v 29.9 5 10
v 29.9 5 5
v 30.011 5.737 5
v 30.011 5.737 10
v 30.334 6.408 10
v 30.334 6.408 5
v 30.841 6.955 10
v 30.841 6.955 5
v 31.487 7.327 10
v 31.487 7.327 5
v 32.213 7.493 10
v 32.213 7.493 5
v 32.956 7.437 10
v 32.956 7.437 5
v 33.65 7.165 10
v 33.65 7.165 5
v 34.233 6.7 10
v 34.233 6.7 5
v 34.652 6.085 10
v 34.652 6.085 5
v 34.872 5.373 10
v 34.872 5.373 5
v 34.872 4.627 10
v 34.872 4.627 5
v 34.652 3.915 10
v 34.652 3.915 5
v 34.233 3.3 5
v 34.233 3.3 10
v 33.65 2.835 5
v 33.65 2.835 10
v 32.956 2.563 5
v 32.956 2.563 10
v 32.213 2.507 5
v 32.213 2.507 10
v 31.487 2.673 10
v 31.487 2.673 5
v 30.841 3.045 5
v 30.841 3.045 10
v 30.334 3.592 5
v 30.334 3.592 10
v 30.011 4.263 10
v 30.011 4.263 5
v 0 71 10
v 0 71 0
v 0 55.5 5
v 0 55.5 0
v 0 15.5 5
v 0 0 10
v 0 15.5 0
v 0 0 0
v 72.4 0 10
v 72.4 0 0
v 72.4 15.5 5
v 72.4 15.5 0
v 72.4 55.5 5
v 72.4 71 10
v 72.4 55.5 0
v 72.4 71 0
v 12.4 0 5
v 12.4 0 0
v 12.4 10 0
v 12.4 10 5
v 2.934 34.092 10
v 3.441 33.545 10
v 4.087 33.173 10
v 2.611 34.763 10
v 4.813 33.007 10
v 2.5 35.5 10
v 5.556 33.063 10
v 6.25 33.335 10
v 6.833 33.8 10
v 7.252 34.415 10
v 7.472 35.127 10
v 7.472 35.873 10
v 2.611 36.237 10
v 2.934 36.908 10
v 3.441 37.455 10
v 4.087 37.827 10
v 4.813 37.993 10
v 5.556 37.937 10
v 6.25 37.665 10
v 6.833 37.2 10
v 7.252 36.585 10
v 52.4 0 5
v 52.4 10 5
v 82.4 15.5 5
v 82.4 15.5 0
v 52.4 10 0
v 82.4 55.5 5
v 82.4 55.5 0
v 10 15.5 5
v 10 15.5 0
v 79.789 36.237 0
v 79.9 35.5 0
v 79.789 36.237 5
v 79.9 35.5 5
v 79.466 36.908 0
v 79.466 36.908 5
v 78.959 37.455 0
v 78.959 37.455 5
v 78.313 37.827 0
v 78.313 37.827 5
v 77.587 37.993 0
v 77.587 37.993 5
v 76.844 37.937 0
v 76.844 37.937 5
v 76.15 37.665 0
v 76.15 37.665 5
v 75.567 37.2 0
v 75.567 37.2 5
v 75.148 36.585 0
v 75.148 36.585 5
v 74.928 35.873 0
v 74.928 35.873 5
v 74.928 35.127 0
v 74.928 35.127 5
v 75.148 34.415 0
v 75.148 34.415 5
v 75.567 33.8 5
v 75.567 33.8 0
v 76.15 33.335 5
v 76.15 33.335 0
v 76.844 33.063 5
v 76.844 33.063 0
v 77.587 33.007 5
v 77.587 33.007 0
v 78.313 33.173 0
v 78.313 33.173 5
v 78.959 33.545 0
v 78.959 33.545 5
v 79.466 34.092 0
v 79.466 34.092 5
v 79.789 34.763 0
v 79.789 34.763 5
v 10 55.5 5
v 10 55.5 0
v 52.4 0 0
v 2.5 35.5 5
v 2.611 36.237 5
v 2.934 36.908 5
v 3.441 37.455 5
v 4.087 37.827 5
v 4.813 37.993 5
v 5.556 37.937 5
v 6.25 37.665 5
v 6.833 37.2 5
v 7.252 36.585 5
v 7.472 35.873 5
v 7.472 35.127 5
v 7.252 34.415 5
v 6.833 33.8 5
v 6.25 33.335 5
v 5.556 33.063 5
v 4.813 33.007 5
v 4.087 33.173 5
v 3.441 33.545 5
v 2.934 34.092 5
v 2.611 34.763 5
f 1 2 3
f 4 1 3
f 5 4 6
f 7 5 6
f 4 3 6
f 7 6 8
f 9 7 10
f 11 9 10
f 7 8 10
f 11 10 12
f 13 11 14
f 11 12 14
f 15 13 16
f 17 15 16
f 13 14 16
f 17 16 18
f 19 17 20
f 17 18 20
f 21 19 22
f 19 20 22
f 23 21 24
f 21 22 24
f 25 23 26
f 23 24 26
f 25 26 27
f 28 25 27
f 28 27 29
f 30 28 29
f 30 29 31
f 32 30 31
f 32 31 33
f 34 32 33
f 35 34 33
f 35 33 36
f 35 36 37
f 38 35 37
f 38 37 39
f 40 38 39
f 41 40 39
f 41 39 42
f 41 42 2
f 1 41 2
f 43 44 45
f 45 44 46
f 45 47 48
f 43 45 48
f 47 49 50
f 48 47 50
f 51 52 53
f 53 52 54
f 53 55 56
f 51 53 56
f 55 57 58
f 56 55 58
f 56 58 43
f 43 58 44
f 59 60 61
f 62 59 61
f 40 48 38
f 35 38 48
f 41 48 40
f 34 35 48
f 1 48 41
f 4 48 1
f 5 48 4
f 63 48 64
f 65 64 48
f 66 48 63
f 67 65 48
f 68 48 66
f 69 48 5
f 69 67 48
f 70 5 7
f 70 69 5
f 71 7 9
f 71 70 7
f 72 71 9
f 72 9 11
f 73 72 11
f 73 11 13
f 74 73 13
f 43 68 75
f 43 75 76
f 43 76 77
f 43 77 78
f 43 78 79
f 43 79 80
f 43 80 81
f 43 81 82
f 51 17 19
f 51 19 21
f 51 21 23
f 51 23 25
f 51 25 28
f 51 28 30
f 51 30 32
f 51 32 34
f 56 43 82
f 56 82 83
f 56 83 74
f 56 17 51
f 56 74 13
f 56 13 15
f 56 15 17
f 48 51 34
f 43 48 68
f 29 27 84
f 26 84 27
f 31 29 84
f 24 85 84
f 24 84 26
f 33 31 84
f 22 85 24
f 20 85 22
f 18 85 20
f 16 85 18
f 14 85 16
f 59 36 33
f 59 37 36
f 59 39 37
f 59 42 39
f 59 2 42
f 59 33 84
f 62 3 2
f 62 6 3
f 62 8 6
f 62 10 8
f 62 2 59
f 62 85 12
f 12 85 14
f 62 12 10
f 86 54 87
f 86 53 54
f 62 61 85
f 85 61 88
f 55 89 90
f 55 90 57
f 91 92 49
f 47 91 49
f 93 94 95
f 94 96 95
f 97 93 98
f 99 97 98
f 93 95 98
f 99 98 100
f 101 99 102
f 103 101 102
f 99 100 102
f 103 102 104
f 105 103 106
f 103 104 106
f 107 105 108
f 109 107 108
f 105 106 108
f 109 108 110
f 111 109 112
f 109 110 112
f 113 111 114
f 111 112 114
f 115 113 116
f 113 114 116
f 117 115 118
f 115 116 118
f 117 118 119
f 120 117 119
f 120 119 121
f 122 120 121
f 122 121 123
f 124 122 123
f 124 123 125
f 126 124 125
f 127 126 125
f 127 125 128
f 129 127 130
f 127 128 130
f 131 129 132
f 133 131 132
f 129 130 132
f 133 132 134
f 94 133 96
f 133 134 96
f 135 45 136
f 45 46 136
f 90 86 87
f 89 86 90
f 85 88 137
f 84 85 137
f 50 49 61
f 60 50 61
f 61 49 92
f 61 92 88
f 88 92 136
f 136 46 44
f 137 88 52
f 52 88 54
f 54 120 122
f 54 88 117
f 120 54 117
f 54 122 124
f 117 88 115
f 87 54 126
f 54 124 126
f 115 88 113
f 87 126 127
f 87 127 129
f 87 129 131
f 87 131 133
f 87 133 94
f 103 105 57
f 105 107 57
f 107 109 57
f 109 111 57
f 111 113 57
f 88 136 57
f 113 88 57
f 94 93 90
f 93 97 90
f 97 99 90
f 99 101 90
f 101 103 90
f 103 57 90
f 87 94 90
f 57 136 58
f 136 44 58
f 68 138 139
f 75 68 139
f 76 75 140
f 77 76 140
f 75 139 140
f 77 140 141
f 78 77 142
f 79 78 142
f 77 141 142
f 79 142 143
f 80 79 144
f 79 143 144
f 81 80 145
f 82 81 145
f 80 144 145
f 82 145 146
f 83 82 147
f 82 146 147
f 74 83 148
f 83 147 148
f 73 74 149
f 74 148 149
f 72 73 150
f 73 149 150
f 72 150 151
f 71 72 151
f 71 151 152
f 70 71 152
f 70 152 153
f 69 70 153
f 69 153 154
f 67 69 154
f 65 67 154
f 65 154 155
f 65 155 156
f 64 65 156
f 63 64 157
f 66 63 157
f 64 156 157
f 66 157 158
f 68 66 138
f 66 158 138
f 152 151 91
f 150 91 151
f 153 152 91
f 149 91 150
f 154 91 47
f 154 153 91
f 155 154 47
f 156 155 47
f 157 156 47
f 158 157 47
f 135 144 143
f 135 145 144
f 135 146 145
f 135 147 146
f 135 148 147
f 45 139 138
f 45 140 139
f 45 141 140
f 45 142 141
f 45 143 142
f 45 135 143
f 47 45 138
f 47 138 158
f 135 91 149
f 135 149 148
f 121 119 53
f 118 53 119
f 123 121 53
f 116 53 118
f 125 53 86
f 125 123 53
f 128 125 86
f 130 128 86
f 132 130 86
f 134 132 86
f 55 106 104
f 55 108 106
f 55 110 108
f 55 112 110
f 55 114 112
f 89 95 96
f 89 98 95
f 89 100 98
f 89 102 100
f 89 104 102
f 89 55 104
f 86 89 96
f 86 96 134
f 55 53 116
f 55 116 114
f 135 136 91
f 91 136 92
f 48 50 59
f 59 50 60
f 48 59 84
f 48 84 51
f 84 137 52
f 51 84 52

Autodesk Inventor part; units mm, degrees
ref_plane "YZ Plane" through (0, 0, 0) normal (1, 0, 0) x (0, 1, 0)
ref_plane "XZ Plane" through (0, 0, 0) normal (0, 1, 0) x (-1, 0, 0)
ref_plane "XY Plane" through (0, 0, 0) normal (0, 0, 1) x (1, 0, 0)
sketch "Sketch1" plane through (0, 0, 0) normal (0, 0, 1) x (1, 0, 0)
  line L0 (0, 0) -> (72.4, 0)
  line L1 (72.4, 0) -> (72.4, 71)
  line L2 (72.4, 71) -> (0, 71)
  line L3 (0, 71) -> (0, 0)
  dimension "d0" = 72.4
  dimension "d1" = 71
extrude "Extrusion1" add sketch "Sketch1" along normal blind 10
sketch "Sketch2" plane through (0, 0, 10) normal (0, 0, 1) x (1, 0, 0)
  line L0 (72.4, 0) -> (72.4, 71) projected
  line L1 (72.4, 15.5) -> (82.4, 15.5)
  line L2 (82.4, 15.5) -> (82.4, 55.5)
  line L3 (82.4, 55.5) -> (72.4, 55.5)
  line L4 (72.4, 55.5) -> (72.4, 15.5)
  line L5 (72.4, 71) -> (0, 71) projected
  circle A0 centre (77.4, 35.5) radius 2.5
  line L6 (0, 0) -> (72.4, 0) projected
  point P0 (82.4, 35.5)
  point P1 (77.4, 55.5)
  dimension "d4" = 10
  dimension "d5" = 40
  dimension "d7" = 5
  dimension "d31" = 15.5
extrude "Extrusion2" add sketch "Sketch2" against normal blind 10
sketch "Sketch3" plane through (0, 0, 10) normal (0, 0, 1) x (1, 0, 0)
  line L0 (72.4, 55.5) -> (82.4, 55.5) projected
  line L1 (72.4, 15.5) -> (82.4, 15.5) projected
  line L2 (82.4, 55.5) -> (72.4, 55.5)
  line L3 (72.4, 55.5) -> (72.4, 15.5)
  line L4 (72.4, 15.5) -> (82.4, 15.5)
  line L5 (82.4, 15.5) -> (82.4, 55.5)
  point P0 (0, 0)
extrude "Extrusion3" cut sketch "Sketch3" against normal blind 5
sketch "Sketch4" plane through (0, 0, 0) normal (0, 0, -1) x (-1, 0, 0)
  line L0 (0, 71) -> (0, 0) projected
  line L1 (0, 55.5) -> (-10, 55.5)
  line L2 (-10, 55.5) -> (-10, 15.5)
  line L3 (-10, 15.5) -> (0, 15.5)
  line L4 (0, 15.5) -> (0, 55.5)
  point P0 (-72.4, 55.5)
  dimension "d15" = 10
  dimension "d16" = 40
extrude "Extrusion4" cut sketch "Sketch4" against normal blind 5
sketch "Sketch5" plane through (0, 0, 5) normal (0, 0, -1) x (-1, 0, 0)
  circle A0 centre (-5, 35.5) radius 2.5
  line L0 (0, 55.5) -> (0, 15.5) projected
  line L1 (-10, 55.5) -> (0, 55.5) projected
  point P0 (0, 0)
  point P1 (0, 35.5)
  point P2 (-5, 55.5)
  dimension "d19" = 5
extrude "Extrusion5" cut sketch "Sketch5" against normal through all
sketch "Sketch8" plane through (0, 0, 0) normal (0, 0, -1) x (-1, 0, 0)
  line L0 (-12.4, 10) -> (-52.4, 10)
  line L1 (-52.4, 10) -> (-52.4, 0)
  line L2 (-52.4, 0) -> (-12.4, 0)
  line L3 (-12.4, 0) -> (-12.4, 10)
  line L4 (0, 0) -> (-72.4, 0) projected
  line L5 (-72.4, 0) -> (-72.4, 15.5) projected
  point P0 (-36.2, 0)
  dimension "d32" = 40
  dimension "d33" = 10
  dimension "d34" = 20
extrude "Extrusion8" cut sketch "Sketch8" against normal blind 5
sketch "Sketch9" plane through (0, 0, 5) normal (0, 0, -1) x (-1, 0, 0)
  line L0 (-52.4, 10) -> (-12.4, 10) construction
  line L1 (-52.4, 0) -> (-52.4, 10) construction
  line L2 (-12.4, 0) -> (-52.4, 0) construction
  line L3 (-12.4, 10) -> (-12.4, 0) construction
  circle A0 centre (-32.4, 5) radius 2.5
  point P0 (0, 0)
  point P1 (-32.4, 0)
  point P2 (-12.4, 5)
  dimension "d37" = 5
extrude "Extrusion9" cut sketch "Sketch9" against normal through all
properties part number "SP002" material "ABS Plastic"
